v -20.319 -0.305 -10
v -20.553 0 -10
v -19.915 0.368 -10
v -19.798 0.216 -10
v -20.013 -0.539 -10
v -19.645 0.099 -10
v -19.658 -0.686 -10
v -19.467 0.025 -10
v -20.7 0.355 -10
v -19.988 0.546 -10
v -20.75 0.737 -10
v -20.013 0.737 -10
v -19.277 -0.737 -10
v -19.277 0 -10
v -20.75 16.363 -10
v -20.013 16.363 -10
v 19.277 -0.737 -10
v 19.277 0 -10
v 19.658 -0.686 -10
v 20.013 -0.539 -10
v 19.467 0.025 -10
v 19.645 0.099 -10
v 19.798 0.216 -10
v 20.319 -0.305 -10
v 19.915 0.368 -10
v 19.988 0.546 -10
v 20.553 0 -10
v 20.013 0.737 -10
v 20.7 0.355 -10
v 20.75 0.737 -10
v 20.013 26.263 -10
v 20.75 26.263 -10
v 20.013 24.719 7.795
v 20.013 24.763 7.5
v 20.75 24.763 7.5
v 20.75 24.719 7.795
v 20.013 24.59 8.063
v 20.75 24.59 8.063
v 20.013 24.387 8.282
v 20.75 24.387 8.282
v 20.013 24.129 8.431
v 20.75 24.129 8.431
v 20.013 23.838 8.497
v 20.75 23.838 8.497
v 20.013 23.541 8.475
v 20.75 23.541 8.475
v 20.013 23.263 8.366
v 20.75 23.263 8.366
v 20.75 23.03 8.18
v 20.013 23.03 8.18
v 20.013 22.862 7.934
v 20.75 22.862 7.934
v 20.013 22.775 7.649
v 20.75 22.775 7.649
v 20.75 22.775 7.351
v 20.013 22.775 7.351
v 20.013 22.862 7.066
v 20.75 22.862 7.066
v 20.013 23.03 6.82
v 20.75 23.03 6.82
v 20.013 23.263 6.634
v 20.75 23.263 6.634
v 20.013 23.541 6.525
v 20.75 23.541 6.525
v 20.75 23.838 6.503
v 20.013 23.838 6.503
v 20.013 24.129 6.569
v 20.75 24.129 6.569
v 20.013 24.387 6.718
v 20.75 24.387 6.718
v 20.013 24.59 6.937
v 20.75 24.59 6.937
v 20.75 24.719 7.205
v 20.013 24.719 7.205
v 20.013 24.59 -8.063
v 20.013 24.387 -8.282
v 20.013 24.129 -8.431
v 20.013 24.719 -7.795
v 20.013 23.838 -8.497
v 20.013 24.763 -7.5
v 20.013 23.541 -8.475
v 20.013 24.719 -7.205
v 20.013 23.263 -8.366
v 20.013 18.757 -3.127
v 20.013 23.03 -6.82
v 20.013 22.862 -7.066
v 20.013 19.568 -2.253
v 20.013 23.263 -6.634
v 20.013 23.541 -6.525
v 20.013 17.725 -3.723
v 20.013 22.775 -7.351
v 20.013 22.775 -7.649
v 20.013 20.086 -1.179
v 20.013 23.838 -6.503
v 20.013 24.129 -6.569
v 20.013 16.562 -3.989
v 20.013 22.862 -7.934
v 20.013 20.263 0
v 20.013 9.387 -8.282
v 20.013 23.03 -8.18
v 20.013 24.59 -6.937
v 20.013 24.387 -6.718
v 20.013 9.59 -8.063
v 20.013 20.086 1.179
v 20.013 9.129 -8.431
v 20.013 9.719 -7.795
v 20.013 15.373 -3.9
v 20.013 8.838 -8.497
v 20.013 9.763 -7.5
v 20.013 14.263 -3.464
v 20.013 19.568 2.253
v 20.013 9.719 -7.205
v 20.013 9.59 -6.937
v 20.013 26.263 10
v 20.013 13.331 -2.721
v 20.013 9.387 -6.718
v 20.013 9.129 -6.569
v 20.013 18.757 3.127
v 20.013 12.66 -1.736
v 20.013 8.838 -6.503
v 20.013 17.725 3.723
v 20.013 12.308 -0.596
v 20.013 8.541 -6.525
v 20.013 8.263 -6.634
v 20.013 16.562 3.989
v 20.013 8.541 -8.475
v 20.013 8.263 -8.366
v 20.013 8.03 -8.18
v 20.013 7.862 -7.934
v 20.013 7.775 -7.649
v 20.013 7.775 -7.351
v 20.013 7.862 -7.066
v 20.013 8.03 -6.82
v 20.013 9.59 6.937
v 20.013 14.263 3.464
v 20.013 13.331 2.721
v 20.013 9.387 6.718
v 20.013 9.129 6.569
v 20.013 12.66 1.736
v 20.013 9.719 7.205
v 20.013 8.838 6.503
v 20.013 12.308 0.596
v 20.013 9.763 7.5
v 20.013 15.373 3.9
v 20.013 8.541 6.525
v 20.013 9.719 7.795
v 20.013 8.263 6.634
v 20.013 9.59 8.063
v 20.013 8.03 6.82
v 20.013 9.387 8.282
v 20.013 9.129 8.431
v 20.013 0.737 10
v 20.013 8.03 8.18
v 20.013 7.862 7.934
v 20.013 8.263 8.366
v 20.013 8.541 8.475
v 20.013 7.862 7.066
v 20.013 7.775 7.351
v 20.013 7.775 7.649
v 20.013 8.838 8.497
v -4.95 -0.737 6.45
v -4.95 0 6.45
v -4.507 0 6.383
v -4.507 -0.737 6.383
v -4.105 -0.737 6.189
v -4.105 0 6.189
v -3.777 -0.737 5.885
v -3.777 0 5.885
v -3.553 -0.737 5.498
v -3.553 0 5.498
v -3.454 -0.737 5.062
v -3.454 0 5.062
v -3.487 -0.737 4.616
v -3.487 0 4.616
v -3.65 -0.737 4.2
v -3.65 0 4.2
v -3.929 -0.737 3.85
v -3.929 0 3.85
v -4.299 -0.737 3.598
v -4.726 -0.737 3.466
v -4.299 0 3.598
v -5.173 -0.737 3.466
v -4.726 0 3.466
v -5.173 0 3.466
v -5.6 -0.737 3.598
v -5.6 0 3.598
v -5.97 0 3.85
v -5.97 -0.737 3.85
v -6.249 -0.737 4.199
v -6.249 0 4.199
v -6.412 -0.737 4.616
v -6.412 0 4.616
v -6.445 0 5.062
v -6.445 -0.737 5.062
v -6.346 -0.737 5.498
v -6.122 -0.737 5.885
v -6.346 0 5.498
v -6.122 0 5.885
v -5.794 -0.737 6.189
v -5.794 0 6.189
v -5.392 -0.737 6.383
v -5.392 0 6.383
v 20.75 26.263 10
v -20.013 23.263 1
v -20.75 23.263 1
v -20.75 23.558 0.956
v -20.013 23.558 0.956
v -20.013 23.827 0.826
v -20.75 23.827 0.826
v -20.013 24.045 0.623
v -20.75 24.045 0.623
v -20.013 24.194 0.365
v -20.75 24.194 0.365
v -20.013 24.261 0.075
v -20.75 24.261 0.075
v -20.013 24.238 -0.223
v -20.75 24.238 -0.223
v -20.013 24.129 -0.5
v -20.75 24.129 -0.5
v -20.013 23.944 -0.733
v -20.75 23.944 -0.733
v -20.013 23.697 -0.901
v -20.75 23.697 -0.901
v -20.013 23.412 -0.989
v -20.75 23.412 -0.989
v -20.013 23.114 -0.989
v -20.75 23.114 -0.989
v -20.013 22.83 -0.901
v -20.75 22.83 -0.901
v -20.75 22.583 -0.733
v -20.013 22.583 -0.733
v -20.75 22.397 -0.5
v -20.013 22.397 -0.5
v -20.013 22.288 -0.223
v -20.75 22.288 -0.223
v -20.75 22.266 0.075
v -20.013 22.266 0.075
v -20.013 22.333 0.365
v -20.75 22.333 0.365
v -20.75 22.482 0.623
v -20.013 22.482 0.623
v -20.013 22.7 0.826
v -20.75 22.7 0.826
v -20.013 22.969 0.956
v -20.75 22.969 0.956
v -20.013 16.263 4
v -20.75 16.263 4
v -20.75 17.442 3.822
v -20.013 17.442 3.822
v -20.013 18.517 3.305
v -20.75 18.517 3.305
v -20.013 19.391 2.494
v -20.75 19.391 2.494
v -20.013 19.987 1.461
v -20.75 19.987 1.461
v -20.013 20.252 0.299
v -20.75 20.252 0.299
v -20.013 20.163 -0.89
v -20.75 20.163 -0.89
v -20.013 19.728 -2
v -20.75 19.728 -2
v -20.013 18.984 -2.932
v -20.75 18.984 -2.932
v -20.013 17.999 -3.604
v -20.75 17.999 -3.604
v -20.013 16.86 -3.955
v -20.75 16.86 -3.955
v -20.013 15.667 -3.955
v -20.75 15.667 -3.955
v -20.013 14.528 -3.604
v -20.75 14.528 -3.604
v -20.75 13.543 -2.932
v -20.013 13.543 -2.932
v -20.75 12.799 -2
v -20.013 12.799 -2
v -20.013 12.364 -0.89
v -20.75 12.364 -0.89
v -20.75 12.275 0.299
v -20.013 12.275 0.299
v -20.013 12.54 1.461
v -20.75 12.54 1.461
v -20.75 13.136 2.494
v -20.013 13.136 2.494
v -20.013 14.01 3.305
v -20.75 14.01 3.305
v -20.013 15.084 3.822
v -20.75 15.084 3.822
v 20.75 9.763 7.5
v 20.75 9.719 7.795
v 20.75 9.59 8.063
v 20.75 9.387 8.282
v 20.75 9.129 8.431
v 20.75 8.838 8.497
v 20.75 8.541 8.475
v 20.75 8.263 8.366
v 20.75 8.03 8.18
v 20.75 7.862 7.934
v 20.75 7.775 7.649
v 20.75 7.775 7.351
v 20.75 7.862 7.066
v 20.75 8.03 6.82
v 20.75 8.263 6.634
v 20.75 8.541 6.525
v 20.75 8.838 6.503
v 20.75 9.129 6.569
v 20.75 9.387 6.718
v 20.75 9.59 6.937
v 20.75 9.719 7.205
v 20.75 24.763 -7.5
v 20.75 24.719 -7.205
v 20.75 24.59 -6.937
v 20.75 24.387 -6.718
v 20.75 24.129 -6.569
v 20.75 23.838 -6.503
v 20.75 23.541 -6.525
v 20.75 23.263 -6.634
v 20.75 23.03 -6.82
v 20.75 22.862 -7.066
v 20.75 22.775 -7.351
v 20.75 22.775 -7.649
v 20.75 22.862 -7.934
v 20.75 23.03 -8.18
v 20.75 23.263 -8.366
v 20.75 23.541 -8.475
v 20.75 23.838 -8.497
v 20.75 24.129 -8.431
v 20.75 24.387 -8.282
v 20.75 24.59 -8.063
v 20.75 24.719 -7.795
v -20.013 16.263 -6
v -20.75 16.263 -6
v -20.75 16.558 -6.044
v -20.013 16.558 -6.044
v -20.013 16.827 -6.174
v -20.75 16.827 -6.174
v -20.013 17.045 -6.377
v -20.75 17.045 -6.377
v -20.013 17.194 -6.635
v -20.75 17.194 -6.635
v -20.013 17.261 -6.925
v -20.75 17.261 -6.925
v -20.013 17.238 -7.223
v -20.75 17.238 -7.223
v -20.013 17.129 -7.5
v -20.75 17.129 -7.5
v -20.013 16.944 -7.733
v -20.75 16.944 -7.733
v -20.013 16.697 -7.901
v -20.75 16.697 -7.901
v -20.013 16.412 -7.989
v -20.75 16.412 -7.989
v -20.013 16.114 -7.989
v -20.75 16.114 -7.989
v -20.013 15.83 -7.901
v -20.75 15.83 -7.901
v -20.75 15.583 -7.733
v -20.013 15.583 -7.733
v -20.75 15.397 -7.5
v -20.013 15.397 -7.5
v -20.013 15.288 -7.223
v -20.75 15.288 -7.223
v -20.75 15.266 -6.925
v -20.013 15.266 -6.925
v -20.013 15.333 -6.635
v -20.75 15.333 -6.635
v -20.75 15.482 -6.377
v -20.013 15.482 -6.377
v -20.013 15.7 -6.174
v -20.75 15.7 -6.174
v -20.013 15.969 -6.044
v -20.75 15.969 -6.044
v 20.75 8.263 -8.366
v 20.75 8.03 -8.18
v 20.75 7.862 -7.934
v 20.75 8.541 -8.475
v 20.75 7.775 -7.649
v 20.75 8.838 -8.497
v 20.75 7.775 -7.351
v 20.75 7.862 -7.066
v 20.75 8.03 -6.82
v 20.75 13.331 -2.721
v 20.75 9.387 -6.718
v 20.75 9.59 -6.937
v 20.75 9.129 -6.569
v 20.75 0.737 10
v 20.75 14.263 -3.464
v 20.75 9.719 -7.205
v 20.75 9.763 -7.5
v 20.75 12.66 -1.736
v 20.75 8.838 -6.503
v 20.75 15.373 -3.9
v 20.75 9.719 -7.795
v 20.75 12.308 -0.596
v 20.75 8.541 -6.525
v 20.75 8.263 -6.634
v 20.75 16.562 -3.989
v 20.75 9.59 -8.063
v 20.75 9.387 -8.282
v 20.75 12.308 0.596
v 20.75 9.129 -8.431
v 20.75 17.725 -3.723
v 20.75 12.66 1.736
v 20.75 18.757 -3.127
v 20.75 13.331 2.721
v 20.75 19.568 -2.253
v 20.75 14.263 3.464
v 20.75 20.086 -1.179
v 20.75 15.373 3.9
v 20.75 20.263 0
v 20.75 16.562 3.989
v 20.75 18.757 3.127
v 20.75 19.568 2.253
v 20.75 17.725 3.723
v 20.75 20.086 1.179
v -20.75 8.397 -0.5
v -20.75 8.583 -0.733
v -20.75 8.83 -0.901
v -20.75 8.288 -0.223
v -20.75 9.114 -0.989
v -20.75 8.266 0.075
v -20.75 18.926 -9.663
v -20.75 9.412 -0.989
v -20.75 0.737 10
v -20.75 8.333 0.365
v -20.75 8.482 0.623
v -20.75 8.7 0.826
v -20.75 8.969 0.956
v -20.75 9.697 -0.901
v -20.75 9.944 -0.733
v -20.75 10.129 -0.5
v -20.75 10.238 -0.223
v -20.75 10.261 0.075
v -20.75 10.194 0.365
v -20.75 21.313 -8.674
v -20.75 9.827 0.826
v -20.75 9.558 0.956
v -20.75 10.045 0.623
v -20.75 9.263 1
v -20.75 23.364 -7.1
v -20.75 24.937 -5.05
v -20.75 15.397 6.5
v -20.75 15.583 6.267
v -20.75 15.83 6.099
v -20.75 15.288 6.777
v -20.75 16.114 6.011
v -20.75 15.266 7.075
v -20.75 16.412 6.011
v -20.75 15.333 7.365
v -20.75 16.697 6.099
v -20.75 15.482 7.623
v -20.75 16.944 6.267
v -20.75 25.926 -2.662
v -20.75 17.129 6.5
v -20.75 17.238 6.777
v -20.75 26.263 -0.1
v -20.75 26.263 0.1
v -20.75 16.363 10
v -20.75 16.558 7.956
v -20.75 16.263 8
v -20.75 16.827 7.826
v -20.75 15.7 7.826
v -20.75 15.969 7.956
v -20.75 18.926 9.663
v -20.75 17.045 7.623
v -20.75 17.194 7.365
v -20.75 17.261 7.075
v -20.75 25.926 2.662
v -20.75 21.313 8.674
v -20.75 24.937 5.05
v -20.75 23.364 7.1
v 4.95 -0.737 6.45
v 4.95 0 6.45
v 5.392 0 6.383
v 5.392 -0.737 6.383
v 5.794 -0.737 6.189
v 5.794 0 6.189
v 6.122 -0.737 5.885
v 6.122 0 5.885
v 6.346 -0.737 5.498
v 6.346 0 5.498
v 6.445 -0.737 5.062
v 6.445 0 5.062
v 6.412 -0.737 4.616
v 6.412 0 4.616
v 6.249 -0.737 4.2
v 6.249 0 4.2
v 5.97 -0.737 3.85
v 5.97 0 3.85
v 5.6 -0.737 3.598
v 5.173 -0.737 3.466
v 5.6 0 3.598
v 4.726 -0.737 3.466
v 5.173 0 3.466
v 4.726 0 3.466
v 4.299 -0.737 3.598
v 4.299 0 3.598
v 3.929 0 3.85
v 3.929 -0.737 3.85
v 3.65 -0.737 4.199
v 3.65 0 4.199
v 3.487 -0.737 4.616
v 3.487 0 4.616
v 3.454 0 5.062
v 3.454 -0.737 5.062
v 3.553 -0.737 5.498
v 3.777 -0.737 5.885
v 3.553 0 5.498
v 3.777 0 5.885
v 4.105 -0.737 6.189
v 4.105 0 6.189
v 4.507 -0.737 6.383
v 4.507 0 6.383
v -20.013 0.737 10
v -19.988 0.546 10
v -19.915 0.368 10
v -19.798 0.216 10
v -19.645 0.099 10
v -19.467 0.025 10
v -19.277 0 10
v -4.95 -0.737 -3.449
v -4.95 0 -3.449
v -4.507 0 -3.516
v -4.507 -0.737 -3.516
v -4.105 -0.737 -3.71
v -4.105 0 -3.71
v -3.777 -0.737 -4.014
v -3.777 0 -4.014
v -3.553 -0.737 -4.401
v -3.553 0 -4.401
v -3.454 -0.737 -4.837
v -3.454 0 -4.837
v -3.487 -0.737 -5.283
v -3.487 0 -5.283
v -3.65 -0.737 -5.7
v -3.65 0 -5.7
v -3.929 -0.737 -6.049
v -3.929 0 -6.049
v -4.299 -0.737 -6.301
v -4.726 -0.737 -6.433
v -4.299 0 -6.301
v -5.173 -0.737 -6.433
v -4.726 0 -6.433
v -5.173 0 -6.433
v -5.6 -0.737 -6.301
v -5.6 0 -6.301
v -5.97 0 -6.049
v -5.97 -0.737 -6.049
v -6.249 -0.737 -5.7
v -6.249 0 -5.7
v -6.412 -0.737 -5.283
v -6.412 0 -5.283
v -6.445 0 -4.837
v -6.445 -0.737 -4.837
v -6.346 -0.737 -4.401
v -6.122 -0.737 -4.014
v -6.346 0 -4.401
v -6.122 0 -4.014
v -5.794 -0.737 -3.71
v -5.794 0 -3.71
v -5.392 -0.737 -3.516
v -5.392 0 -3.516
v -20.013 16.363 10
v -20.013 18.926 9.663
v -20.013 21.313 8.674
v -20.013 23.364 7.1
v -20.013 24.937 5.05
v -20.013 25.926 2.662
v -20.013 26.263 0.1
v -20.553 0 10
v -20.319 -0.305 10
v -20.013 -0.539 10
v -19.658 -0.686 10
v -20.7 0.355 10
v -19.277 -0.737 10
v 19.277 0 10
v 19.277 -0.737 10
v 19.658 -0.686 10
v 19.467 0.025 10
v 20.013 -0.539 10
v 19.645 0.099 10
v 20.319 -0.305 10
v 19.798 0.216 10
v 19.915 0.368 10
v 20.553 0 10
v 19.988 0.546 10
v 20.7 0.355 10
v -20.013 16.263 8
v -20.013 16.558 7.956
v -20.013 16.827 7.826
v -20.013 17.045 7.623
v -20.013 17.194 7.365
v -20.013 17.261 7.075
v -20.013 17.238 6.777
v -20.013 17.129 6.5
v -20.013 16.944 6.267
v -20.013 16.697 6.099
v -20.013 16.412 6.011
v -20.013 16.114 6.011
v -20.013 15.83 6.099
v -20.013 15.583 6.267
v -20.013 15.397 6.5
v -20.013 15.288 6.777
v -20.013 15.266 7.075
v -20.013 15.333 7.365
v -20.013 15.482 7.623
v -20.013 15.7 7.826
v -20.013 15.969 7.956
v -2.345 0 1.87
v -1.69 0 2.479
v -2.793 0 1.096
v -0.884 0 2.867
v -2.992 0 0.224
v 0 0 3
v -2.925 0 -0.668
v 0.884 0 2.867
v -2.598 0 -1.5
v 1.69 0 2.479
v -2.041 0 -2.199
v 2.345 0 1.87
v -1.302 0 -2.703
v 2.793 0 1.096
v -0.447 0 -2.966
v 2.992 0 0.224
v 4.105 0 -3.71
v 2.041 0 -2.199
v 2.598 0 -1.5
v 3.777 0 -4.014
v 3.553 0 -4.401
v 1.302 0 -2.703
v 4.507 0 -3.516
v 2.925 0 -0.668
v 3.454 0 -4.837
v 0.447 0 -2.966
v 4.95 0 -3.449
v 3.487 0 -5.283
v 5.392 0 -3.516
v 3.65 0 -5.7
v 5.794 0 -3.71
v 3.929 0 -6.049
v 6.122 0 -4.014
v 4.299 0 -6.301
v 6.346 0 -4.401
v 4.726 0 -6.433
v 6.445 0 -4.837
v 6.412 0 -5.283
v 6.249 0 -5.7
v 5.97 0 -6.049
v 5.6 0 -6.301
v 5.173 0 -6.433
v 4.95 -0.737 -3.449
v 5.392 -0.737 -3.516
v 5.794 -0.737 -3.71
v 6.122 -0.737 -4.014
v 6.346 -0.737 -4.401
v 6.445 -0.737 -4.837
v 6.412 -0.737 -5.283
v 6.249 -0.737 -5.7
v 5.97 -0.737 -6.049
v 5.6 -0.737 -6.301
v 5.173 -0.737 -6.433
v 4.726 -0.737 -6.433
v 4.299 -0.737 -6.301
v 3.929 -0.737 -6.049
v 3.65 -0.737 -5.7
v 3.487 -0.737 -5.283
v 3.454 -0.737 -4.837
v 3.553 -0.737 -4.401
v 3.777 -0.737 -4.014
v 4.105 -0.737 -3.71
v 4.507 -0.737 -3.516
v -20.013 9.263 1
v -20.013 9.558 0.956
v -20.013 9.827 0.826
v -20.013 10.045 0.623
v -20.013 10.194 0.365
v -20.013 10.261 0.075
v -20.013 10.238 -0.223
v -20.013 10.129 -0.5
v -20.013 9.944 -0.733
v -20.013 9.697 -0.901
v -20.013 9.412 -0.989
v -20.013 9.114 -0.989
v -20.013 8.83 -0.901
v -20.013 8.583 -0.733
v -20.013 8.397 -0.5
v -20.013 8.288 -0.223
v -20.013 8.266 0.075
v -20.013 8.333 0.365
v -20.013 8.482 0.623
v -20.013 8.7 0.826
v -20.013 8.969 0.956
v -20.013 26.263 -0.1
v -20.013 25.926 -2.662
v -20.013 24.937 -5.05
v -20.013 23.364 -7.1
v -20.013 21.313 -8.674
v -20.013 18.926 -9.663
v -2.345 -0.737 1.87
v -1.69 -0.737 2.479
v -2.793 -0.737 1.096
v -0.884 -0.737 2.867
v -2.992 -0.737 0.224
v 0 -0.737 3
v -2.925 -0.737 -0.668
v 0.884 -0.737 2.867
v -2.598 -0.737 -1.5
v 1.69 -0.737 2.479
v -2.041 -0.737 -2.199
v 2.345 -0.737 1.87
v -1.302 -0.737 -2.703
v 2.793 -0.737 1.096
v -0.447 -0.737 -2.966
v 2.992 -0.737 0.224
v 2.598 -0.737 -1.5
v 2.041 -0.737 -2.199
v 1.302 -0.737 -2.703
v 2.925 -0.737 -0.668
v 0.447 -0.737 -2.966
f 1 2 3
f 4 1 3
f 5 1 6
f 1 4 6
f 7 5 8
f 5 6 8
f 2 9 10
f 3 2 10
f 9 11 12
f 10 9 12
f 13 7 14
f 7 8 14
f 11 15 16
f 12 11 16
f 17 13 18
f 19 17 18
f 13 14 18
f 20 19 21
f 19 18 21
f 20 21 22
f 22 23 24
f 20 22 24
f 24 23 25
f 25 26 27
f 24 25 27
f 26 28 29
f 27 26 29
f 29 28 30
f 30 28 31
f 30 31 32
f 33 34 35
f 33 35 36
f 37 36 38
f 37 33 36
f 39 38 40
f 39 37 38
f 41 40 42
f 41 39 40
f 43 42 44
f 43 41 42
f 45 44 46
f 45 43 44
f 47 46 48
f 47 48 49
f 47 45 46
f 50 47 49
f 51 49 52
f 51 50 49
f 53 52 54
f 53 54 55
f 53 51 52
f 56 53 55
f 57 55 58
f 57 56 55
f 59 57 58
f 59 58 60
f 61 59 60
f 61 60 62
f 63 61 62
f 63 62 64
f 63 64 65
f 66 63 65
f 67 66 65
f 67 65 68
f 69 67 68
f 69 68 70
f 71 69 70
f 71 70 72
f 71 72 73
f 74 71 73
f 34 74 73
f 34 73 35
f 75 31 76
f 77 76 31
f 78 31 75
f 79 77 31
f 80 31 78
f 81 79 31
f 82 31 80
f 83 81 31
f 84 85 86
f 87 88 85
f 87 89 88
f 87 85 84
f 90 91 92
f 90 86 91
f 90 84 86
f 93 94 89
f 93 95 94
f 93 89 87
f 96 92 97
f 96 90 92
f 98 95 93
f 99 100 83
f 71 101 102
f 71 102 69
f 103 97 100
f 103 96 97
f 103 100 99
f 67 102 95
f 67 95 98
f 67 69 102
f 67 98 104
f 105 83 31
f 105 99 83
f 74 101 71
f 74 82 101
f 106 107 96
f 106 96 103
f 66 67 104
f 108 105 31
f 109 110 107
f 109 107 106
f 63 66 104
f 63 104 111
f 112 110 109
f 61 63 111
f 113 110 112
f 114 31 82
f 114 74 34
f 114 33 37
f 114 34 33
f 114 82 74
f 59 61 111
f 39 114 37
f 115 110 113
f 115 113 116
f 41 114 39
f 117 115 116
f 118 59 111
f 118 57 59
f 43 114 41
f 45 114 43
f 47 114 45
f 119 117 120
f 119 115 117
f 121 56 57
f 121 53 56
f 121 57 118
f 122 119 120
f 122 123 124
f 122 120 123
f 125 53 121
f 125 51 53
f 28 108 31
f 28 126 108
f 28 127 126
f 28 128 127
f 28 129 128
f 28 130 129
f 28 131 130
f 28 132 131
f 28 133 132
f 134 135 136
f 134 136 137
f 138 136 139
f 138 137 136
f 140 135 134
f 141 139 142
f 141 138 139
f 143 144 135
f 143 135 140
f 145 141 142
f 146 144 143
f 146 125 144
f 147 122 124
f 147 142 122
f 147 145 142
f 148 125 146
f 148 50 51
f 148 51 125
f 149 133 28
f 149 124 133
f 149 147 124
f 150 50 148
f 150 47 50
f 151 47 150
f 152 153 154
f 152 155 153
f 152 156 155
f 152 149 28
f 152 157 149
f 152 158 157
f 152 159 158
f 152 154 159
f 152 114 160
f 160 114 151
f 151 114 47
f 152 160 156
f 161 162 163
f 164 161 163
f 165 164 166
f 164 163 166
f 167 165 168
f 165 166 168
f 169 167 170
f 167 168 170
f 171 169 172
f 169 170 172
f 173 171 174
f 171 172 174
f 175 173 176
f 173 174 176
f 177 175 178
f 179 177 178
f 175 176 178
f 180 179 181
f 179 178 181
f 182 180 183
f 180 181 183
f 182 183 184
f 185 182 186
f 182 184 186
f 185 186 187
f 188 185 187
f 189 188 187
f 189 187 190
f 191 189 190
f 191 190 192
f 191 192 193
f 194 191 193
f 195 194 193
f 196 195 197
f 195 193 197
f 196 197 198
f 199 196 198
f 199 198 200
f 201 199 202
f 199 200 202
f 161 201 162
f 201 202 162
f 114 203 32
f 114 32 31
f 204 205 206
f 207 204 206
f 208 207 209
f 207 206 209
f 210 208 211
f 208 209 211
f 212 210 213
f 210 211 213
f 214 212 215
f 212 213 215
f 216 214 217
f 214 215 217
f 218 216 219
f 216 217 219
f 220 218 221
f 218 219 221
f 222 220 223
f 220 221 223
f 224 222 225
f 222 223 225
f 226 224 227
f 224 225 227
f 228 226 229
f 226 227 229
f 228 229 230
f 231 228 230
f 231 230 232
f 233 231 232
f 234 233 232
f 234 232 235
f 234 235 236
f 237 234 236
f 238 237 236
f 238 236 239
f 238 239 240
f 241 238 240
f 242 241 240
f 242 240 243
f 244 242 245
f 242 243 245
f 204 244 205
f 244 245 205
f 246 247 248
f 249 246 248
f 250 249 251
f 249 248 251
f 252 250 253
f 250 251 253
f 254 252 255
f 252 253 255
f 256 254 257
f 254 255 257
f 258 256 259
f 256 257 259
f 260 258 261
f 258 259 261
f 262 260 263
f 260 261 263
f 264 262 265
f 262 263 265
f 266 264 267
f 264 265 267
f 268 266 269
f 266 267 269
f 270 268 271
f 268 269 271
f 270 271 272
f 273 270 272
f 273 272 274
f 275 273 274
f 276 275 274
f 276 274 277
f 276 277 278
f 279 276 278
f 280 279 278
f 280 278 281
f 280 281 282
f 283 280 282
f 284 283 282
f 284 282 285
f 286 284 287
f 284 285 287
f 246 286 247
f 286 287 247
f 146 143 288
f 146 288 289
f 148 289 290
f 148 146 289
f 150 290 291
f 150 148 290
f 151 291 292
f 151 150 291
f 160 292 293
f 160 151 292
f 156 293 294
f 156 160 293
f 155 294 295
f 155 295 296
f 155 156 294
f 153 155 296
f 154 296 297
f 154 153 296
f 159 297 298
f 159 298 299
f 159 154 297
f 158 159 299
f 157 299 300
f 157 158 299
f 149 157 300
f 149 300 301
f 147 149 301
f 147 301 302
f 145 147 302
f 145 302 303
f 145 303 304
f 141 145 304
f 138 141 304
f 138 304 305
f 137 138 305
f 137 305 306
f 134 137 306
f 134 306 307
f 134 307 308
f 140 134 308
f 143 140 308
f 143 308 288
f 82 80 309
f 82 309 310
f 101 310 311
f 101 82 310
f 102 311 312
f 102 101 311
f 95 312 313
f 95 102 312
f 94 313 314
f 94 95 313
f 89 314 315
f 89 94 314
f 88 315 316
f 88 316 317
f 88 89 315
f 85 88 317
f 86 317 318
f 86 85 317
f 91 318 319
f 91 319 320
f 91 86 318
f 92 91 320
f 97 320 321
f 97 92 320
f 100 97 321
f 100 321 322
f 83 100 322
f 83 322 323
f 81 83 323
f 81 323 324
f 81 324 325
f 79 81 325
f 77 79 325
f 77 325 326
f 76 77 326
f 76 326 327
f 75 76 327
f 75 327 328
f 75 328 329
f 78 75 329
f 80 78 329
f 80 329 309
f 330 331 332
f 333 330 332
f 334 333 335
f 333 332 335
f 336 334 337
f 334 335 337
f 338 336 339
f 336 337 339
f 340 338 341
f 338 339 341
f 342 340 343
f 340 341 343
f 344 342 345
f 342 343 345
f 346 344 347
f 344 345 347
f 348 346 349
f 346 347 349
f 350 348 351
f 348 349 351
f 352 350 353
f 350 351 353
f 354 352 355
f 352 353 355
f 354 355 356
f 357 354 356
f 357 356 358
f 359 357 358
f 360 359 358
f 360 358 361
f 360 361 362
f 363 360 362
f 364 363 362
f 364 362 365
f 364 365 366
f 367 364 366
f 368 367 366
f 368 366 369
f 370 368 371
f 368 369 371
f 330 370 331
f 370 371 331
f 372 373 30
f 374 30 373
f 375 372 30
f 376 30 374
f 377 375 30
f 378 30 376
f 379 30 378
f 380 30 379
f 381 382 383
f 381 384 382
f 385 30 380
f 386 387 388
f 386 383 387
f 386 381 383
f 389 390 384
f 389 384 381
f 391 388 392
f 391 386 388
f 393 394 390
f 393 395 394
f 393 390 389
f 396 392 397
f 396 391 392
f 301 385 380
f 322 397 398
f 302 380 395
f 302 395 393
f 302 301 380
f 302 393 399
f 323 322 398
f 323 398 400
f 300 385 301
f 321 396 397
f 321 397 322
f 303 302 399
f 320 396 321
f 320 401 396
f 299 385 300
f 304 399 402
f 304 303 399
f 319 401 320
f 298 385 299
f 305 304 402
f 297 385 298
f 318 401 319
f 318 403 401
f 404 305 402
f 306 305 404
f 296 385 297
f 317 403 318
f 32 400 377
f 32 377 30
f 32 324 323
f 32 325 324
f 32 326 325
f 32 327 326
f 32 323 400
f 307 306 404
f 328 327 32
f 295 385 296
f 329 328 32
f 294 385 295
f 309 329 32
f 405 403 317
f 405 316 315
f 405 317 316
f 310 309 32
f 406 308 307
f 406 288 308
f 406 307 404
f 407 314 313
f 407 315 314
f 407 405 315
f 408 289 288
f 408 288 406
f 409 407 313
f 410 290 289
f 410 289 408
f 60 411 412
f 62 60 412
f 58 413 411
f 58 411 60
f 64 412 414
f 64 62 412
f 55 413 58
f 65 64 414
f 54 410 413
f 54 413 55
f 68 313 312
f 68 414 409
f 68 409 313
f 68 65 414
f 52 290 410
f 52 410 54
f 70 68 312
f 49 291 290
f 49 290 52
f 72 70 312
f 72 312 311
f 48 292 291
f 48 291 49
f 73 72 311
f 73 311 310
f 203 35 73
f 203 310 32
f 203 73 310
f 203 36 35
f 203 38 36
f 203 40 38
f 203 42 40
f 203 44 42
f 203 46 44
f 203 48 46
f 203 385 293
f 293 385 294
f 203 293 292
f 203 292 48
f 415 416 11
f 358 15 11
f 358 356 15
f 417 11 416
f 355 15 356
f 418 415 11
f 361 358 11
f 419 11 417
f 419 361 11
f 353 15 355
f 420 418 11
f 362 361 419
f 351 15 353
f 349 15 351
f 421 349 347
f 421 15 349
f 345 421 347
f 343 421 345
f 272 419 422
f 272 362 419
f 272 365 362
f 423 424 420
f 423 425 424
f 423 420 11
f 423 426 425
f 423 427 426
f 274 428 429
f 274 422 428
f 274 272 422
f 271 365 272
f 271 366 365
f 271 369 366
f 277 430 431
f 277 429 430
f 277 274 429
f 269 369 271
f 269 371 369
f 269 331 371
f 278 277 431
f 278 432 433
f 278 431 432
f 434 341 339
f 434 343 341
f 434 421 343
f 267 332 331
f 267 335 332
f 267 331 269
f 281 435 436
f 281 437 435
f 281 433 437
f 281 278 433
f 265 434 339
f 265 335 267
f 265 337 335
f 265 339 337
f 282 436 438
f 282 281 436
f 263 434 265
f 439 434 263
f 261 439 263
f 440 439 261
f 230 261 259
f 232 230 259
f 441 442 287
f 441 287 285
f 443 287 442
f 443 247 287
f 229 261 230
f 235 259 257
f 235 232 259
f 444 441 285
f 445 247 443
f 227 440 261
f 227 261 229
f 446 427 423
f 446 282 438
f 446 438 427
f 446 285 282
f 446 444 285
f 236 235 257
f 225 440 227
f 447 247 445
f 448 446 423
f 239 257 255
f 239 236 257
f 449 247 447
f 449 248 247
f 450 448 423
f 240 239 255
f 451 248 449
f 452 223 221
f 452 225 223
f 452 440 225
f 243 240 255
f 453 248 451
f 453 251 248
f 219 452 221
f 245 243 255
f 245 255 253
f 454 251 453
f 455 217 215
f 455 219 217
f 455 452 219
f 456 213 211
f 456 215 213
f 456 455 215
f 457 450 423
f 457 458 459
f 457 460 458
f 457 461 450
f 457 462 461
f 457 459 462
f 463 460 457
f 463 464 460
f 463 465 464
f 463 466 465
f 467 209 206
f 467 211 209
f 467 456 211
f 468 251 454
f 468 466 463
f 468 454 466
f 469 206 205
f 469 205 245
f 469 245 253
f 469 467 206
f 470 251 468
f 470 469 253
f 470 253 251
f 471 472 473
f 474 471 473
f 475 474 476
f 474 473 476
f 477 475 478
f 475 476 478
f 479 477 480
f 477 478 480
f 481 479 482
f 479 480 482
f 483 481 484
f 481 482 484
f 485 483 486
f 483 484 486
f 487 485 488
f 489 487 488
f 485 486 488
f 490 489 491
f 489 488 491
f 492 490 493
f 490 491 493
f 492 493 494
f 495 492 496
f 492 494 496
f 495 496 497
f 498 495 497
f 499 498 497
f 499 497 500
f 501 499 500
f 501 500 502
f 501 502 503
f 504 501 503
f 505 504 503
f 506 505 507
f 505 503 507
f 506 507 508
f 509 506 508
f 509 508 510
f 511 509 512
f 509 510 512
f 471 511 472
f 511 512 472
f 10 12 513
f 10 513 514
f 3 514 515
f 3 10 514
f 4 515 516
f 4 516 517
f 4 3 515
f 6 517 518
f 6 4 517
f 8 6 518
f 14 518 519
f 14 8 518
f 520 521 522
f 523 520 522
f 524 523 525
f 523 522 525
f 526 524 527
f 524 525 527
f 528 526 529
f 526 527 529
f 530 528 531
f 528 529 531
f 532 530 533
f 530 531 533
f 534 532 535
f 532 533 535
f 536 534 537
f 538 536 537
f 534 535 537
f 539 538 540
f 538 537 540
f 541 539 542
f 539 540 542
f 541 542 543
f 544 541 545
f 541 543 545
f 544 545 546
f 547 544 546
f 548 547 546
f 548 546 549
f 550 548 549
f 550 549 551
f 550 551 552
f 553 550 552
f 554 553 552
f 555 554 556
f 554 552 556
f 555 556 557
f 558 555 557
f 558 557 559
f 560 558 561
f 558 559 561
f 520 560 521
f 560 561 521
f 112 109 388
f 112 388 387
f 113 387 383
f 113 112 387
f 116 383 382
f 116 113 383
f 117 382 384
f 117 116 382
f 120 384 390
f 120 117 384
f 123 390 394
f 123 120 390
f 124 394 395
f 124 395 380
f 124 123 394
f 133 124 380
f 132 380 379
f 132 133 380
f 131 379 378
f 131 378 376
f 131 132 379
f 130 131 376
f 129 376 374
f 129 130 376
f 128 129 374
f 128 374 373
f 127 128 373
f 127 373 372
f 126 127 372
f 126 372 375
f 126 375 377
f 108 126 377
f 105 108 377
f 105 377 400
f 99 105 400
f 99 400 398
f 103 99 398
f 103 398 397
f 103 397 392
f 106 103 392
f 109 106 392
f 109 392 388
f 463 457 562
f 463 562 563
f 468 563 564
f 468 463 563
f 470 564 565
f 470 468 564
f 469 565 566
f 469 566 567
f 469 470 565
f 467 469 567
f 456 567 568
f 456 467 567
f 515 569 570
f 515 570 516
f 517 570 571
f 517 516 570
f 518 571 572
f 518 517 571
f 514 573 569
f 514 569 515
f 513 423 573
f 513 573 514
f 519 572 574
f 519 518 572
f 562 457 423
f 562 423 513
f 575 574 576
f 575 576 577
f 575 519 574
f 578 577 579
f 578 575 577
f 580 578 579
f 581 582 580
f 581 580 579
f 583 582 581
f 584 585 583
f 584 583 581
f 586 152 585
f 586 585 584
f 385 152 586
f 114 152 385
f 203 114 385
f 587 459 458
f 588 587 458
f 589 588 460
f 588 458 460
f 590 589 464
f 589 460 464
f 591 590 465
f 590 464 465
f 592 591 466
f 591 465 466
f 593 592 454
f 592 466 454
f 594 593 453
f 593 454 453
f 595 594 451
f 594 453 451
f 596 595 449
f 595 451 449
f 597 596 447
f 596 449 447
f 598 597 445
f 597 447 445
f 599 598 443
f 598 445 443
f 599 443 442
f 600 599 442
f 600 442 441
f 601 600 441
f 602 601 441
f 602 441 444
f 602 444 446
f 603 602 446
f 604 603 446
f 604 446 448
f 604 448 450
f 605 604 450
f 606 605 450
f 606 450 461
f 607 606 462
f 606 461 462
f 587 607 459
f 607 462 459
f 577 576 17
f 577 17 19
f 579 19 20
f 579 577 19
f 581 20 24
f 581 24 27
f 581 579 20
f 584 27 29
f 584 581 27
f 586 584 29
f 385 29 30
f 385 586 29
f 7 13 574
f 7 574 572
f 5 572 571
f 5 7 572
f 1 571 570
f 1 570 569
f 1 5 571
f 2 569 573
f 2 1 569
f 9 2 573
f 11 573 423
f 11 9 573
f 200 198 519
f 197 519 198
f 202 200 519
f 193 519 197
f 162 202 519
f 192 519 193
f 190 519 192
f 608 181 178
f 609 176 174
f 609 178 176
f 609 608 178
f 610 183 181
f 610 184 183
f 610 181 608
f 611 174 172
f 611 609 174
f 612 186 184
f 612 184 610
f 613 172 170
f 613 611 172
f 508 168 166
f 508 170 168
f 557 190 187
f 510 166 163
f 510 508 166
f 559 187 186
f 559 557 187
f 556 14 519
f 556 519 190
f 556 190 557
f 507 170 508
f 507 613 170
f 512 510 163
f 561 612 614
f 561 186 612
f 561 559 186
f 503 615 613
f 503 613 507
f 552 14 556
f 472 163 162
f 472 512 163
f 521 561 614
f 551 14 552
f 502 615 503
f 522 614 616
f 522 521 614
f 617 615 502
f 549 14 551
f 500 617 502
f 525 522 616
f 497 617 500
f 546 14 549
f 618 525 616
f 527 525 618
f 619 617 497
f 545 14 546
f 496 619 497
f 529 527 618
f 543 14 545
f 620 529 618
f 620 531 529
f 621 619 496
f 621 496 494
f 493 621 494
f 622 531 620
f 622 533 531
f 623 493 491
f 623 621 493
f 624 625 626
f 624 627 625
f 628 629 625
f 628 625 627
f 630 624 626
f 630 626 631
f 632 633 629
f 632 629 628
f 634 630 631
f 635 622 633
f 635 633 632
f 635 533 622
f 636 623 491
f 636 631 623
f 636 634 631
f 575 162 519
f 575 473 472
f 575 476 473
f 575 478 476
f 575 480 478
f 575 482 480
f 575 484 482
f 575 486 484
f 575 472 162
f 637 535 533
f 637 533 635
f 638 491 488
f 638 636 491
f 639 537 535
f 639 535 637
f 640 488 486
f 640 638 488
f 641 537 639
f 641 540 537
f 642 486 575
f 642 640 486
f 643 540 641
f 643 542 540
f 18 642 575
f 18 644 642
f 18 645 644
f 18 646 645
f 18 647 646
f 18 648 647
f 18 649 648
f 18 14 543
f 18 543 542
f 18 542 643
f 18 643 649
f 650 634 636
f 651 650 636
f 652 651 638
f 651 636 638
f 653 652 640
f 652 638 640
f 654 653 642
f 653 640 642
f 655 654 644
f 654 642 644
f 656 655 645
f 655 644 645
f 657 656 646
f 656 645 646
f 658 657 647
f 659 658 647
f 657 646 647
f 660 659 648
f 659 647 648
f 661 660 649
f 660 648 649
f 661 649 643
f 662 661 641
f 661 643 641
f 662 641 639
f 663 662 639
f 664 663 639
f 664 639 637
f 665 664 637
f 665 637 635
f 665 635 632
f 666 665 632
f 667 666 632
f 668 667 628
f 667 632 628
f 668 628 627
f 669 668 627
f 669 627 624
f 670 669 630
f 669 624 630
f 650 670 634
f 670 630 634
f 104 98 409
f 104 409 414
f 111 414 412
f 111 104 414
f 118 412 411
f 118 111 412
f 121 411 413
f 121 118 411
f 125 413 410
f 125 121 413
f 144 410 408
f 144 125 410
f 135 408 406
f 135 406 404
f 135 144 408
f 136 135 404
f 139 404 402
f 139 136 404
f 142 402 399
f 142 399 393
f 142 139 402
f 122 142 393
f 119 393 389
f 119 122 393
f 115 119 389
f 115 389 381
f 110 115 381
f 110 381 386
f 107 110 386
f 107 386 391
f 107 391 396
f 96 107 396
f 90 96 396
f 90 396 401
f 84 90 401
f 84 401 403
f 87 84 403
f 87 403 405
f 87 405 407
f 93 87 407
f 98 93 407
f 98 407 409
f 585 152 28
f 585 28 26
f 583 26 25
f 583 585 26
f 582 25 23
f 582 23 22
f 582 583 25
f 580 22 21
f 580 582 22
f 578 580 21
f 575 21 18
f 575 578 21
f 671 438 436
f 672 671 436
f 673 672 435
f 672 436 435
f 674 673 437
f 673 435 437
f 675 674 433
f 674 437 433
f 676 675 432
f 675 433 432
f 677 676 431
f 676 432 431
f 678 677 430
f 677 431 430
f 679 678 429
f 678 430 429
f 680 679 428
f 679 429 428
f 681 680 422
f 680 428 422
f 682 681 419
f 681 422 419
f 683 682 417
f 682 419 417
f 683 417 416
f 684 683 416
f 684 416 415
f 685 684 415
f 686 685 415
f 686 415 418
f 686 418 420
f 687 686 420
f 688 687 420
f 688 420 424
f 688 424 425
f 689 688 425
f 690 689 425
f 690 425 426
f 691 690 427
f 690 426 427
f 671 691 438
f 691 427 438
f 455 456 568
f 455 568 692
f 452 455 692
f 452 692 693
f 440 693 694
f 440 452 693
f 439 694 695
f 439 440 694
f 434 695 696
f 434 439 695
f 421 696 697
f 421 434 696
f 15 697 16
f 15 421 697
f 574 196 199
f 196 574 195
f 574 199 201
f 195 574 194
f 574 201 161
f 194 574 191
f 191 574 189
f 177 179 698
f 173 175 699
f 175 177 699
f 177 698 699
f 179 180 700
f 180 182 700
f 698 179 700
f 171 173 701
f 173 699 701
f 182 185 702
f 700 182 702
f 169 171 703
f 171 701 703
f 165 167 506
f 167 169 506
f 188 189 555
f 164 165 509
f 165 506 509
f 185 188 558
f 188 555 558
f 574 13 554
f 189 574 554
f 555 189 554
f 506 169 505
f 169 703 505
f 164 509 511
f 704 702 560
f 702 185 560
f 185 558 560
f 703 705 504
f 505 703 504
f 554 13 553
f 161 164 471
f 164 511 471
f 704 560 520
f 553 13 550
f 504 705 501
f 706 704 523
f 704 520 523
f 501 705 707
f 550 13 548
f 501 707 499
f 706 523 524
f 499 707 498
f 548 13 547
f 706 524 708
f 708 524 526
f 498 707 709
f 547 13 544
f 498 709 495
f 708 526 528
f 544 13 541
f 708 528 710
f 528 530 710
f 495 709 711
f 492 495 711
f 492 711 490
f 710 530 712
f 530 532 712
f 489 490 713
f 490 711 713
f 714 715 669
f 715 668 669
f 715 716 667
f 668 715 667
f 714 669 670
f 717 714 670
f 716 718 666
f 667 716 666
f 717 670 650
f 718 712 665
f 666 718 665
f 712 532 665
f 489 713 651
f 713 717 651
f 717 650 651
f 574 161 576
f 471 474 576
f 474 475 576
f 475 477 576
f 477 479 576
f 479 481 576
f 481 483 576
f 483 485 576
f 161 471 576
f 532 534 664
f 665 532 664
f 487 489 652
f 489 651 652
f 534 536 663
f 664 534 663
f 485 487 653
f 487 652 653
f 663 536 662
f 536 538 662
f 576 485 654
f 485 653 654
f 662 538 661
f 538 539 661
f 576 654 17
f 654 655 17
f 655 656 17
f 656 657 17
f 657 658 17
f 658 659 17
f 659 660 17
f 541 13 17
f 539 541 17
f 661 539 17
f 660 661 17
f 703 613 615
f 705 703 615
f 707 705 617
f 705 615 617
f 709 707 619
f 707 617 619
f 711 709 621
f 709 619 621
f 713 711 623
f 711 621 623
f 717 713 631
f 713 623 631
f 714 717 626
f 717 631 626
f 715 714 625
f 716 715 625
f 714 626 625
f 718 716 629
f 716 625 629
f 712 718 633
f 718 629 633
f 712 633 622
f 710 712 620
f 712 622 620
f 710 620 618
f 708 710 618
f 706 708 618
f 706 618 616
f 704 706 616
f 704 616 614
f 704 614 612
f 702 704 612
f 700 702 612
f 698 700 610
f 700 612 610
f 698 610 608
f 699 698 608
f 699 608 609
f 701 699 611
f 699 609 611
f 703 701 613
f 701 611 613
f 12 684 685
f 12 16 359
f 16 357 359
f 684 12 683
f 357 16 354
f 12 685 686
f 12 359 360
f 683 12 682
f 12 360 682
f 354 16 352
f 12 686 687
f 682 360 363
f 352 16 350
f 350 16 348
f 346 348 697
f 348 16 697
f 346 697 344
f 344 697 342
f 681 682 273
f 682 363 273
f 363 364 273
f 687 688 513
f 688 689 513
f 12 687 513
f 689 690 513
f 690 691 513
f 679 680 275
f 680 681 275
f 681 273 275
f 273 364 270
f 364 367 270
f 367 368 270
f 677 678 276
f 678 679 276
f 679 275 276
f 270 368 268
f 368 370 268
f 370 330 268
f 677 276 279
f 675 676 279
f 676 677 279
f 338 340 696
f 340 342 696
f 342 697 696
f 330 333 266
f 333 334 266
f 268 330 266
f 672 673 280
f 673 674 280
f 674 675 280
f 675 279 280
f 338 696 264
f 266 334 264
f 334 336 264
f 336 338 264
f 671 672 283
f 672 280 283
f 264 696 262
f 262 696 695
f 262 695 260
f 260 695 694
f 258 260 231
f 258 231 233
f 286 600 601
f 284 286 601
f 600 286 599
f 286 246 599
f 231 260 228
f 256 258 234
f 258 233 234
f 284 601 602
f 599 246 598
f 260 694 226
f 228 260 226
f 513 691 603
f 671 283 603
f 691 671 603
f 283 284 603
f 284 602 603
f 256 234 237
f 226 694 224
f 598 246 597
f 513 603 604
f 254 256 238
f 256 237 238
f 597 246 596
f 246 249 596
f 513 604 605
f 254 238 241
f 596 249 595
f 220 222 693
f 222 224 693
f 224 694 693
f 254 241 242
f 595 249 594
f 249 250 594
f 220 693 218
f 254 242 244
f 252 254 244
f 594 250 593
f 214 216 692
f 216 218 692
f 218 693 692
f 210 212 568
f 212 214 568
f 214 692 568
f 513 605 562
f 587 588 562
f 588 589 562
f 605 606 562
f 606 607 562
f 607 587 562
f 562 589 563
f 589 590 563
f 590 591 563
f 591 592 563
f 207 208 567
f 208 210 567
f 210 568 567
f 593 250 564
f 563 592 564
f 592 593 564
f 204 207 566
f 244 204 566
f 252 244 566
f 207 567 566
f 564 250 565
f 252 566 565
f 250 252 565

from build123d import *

# Parameters (mm, degrees)
SKETCH_1_W                       = 41.5
SKETCH_1_H                       = 20
SKETCH_1_R                       = 3
SKETCH_1_R_2                     = 1.5
SM_BASE_FLANGE_1_DEPTH           = 0.7366
SM_EDGE_FLANGE_1_STRIP_W         = 4.4196
SM_EDGE_FLANGE_1_STRIP_H         = 0.7366
SM_EDGE_FLANGE_1_STRIP_CUT_DEPTH = 20
SM_EDGE_FLANGE_1_DEPTH           = 20
SM_EDGE_FLANGE_1_PROFILE_R       = 1
SM_EDGE_FLANGE_1_PROFILE_R_2     = 4
SM_EDGE_FLANGE_1_FLAT_DEPTH      = 0.7366
SM_EDGE_FLANGE_2_STRIP_W         = 4.4196
SM_EDGE_FLANGE_2_STRIP_H         = 0.7366
SM_EDGE_FLANGE_2_STRIP_CUT_DEPTH = 20
SM_EDGE_FLANGE_2_DEPTH           = 20
CUT_EXTRUDE_START                = -10
SKETCH_14_R                      = 4
SKETCH_14_R_2                    = 1
CUT_EXTRUDE_1_DEPTH              = 10


# Sheet-metal steps are written as plain solids
with BuildPart() as part:
    # Sketch 1 → 基体-法兰1 (new body)
    with BuildSketch(Plane(origin=(0, 0, 0), x_dir=(1, 0, 0), z_dir=(0, 1, 0))):
        Rectangle(SKETCH_1_W, SKETCH_1_H)
        with Locations(Location((0, 0, 0), (0, 0, 270))):
            Circle(SKETCH_1_R, mode=Mode.SUBTRACT)
        with Locations(Location((4.9495, 4.9495, 0), (0, 0, 270))):
            Circle(SKETCH_1_R_2, mode=Mode.SUBTRACT)
        with Locations(Location((-4.9495, 4.9495, 0), (0, 0, 270))):
            Circle(SKETCH_1_R_2, mode=Mode.SUBTRACT)
        with Locations(Location((-4.9495, -4.9495, 0), (0, 0, 270))):
            Circle(SKETCH_1_R_2, mode=Mode.SUBTRACT)
        with Locations(Location((4.9495, -4.9495, 0), (0, 0, 270))):
            Circle(SKETCH_1_R_2, mode=Mode.SUBTRACT)
    extrude(amount=-SM_BASE_FLANGE_1_DEPTH)

    # 边线-法兰1 strip (across the edge) → 边线-法兰1 strip cut (cut)
    with BuildSketch(Plane(origin=(-20.75, 0, -10), x_dir=(1, 0, 0), z_dir=(0, 0, 1))):
        with Locations((-0.7366, -0.3683)):
            Rectangle(SM_EDGE_FLANGE_1_STRIP_W, SM_EDGE_FLANGE_1_STRIP_H)
    extrude(amount=SM_EDGE_FLANGE_1_STRIP_CUT_DEPTH, mode=Mode.SUBTRACT)

    # 边线-法兰1 bend section (across the edge) → 边线-法兰1 (add)
    with BuildSketch(Plane(origin=(-20.75, 0, -10), x_dir=(1, 0, 0), z_dir=(0, 0, 1))):
        with BuildLine():
            Line((0, 0.7366), (0.7366, 0.7366))
            ThreePointArc((0.7366, 0.7366), (0.952345145, 0.215745145), (1.4732, 0))
            Line((1.4732, 0), (1.4732, -0.7366))
            ThreePointArc((1.4732, -0.7366), (0.43149029, -0.30510971), (0, 0.7366))
        make_face()
    extrude(amount=SM_EDGE_FLANGE_1_DEPTH)

    # 边线-法兰1 profile (on flange) → 边线-法兰1 flat (add)
    with BuildSketch(Plane.ZY.offset(20.75)):
        with BuildLine():
            Line((-10, 0.7366), (10, 0.7366))
            Line((10, 0.7366), (10, 16.3634))
            ThreePointArc((10, 16.3634), (7.100357134, 23.363757134), (0.1, 26.2634))
            Line((0.1, 26.2634), (-0.1, 26.2634))
            ThreePointArc((-0.1, 26.2634), (-7.100357134, 23.363757134), (-10, 16.3634))
            Line((-10, 16.3634), (-10, 0.7366))
        make_face()
        with Locations((0, 9.2634)):
            Circle(SM_EDGE_FLANGE_1_PROFILE_R, mode=Mode.SUBTRACT)
        with Locations((7, 16.2634)):
            Circle(SM_EDGE_FLANGE_1_PROFILE_R, mode=Mode.SUBTRACT)
        with Locations((0, 16.2634)):
            Circle(SM_EDGE_FLANGE_1_PROFILE_R_2, mode=Mode.SUBTRACT)
        with Locations((-7, 16.2634)):
            Circle(SM_EDGE_FLANGE_1_PROFILE_R, mode=Mode.SUBTRACT)
        with Locations((0, 23.2634)):
            Circle(SM_EDGE_FLANGE_1_PROFILE_R, mode=Mode.SUBTRACT)
    extrude(amount=-SM_EDGE_FLANGE_1_FLAT_DEPTH)

    # 边线-法兰2 strip (across the edge) → 边线-法兰2 strip cut (cut)
    with BuildSketch(Plane(origin=(20.75, 0, 10), x_dir=(-1, 0, 0), z_dir=(0, 0, -1))):
        with Locations((-0.7366, -0.3683)):
            Rectangle(SM_EDGE_FLANGE_2_STRIP_W, SM_EDGE_FLANGE_2_STRIP_H)
    extrude(amount=SM_EDGE_FLANGE_2_STRIP_CUT_DEPTH, mode=Mode.SUBTRACT)

    # 边线-法兰2 section (across the edge) → 边线-法兰2 (add)
    with BuildSketch(Plane(origin=(20.75, 0, 10), x_dir=(-1, 0, 0), z_dir=(0, 0, -1))):
        with BuildLine():
            Line((0, 0.7366), (0, 26.2634))
            Line((0, 26.2634), (0.7366, 26.2634))
            Line((0.7366, 26.2634), (0.7366, 0.7366))
            ThreePointArc((0.7366, 0.7366), (0.952345145, 0.215745145), (1.4732, 0))
            Line((1.4732, 0), (1.4732, -0.7366))
            ThreePointArc((1.4732, -0.7366), (0.43149029, -0.30510971), (0, 0.7366))
        make_face()
    extrude(amount=SM_EDGE_FLANGE_2_DEPTH)

    # 草图14 → 切除-拉伸1 (cut)
    with BuildSketch(Plane(origin=(20.75, 0, 0), x_dir=(0, 0, -1), z_dir=(1, 0, 0)).offset(CUT_EXTRUDE_START)):
        with Locations(Location((0, 16.2634, 0), (0, 0, 90))):
            Circle(SKETCH_14_R)
        with Locations(Location((-7.5, 23.7634, 0), (0, 0, 90))):
            Circle(SKETCH_14_R_2)
        with Locations(Location((7.5, 23.7634, 0), (0, 0, 90))):
            Circle(SKETCH_14_R_2)
        with Locations(Location((7.5, 8.7634, 0), (0, 0, 90))):
            Circle(SKETCH_14_R_2)
        with Locations(Location((-7.5, 8.7634, 0), (0, 0, 90))):
            Circle(SKETCH_14_R_2)
    extrude(amount=CUT_EXTRUDE_1_DEPTH, mode=Mode.SUBTRACT)


solid = part.part
